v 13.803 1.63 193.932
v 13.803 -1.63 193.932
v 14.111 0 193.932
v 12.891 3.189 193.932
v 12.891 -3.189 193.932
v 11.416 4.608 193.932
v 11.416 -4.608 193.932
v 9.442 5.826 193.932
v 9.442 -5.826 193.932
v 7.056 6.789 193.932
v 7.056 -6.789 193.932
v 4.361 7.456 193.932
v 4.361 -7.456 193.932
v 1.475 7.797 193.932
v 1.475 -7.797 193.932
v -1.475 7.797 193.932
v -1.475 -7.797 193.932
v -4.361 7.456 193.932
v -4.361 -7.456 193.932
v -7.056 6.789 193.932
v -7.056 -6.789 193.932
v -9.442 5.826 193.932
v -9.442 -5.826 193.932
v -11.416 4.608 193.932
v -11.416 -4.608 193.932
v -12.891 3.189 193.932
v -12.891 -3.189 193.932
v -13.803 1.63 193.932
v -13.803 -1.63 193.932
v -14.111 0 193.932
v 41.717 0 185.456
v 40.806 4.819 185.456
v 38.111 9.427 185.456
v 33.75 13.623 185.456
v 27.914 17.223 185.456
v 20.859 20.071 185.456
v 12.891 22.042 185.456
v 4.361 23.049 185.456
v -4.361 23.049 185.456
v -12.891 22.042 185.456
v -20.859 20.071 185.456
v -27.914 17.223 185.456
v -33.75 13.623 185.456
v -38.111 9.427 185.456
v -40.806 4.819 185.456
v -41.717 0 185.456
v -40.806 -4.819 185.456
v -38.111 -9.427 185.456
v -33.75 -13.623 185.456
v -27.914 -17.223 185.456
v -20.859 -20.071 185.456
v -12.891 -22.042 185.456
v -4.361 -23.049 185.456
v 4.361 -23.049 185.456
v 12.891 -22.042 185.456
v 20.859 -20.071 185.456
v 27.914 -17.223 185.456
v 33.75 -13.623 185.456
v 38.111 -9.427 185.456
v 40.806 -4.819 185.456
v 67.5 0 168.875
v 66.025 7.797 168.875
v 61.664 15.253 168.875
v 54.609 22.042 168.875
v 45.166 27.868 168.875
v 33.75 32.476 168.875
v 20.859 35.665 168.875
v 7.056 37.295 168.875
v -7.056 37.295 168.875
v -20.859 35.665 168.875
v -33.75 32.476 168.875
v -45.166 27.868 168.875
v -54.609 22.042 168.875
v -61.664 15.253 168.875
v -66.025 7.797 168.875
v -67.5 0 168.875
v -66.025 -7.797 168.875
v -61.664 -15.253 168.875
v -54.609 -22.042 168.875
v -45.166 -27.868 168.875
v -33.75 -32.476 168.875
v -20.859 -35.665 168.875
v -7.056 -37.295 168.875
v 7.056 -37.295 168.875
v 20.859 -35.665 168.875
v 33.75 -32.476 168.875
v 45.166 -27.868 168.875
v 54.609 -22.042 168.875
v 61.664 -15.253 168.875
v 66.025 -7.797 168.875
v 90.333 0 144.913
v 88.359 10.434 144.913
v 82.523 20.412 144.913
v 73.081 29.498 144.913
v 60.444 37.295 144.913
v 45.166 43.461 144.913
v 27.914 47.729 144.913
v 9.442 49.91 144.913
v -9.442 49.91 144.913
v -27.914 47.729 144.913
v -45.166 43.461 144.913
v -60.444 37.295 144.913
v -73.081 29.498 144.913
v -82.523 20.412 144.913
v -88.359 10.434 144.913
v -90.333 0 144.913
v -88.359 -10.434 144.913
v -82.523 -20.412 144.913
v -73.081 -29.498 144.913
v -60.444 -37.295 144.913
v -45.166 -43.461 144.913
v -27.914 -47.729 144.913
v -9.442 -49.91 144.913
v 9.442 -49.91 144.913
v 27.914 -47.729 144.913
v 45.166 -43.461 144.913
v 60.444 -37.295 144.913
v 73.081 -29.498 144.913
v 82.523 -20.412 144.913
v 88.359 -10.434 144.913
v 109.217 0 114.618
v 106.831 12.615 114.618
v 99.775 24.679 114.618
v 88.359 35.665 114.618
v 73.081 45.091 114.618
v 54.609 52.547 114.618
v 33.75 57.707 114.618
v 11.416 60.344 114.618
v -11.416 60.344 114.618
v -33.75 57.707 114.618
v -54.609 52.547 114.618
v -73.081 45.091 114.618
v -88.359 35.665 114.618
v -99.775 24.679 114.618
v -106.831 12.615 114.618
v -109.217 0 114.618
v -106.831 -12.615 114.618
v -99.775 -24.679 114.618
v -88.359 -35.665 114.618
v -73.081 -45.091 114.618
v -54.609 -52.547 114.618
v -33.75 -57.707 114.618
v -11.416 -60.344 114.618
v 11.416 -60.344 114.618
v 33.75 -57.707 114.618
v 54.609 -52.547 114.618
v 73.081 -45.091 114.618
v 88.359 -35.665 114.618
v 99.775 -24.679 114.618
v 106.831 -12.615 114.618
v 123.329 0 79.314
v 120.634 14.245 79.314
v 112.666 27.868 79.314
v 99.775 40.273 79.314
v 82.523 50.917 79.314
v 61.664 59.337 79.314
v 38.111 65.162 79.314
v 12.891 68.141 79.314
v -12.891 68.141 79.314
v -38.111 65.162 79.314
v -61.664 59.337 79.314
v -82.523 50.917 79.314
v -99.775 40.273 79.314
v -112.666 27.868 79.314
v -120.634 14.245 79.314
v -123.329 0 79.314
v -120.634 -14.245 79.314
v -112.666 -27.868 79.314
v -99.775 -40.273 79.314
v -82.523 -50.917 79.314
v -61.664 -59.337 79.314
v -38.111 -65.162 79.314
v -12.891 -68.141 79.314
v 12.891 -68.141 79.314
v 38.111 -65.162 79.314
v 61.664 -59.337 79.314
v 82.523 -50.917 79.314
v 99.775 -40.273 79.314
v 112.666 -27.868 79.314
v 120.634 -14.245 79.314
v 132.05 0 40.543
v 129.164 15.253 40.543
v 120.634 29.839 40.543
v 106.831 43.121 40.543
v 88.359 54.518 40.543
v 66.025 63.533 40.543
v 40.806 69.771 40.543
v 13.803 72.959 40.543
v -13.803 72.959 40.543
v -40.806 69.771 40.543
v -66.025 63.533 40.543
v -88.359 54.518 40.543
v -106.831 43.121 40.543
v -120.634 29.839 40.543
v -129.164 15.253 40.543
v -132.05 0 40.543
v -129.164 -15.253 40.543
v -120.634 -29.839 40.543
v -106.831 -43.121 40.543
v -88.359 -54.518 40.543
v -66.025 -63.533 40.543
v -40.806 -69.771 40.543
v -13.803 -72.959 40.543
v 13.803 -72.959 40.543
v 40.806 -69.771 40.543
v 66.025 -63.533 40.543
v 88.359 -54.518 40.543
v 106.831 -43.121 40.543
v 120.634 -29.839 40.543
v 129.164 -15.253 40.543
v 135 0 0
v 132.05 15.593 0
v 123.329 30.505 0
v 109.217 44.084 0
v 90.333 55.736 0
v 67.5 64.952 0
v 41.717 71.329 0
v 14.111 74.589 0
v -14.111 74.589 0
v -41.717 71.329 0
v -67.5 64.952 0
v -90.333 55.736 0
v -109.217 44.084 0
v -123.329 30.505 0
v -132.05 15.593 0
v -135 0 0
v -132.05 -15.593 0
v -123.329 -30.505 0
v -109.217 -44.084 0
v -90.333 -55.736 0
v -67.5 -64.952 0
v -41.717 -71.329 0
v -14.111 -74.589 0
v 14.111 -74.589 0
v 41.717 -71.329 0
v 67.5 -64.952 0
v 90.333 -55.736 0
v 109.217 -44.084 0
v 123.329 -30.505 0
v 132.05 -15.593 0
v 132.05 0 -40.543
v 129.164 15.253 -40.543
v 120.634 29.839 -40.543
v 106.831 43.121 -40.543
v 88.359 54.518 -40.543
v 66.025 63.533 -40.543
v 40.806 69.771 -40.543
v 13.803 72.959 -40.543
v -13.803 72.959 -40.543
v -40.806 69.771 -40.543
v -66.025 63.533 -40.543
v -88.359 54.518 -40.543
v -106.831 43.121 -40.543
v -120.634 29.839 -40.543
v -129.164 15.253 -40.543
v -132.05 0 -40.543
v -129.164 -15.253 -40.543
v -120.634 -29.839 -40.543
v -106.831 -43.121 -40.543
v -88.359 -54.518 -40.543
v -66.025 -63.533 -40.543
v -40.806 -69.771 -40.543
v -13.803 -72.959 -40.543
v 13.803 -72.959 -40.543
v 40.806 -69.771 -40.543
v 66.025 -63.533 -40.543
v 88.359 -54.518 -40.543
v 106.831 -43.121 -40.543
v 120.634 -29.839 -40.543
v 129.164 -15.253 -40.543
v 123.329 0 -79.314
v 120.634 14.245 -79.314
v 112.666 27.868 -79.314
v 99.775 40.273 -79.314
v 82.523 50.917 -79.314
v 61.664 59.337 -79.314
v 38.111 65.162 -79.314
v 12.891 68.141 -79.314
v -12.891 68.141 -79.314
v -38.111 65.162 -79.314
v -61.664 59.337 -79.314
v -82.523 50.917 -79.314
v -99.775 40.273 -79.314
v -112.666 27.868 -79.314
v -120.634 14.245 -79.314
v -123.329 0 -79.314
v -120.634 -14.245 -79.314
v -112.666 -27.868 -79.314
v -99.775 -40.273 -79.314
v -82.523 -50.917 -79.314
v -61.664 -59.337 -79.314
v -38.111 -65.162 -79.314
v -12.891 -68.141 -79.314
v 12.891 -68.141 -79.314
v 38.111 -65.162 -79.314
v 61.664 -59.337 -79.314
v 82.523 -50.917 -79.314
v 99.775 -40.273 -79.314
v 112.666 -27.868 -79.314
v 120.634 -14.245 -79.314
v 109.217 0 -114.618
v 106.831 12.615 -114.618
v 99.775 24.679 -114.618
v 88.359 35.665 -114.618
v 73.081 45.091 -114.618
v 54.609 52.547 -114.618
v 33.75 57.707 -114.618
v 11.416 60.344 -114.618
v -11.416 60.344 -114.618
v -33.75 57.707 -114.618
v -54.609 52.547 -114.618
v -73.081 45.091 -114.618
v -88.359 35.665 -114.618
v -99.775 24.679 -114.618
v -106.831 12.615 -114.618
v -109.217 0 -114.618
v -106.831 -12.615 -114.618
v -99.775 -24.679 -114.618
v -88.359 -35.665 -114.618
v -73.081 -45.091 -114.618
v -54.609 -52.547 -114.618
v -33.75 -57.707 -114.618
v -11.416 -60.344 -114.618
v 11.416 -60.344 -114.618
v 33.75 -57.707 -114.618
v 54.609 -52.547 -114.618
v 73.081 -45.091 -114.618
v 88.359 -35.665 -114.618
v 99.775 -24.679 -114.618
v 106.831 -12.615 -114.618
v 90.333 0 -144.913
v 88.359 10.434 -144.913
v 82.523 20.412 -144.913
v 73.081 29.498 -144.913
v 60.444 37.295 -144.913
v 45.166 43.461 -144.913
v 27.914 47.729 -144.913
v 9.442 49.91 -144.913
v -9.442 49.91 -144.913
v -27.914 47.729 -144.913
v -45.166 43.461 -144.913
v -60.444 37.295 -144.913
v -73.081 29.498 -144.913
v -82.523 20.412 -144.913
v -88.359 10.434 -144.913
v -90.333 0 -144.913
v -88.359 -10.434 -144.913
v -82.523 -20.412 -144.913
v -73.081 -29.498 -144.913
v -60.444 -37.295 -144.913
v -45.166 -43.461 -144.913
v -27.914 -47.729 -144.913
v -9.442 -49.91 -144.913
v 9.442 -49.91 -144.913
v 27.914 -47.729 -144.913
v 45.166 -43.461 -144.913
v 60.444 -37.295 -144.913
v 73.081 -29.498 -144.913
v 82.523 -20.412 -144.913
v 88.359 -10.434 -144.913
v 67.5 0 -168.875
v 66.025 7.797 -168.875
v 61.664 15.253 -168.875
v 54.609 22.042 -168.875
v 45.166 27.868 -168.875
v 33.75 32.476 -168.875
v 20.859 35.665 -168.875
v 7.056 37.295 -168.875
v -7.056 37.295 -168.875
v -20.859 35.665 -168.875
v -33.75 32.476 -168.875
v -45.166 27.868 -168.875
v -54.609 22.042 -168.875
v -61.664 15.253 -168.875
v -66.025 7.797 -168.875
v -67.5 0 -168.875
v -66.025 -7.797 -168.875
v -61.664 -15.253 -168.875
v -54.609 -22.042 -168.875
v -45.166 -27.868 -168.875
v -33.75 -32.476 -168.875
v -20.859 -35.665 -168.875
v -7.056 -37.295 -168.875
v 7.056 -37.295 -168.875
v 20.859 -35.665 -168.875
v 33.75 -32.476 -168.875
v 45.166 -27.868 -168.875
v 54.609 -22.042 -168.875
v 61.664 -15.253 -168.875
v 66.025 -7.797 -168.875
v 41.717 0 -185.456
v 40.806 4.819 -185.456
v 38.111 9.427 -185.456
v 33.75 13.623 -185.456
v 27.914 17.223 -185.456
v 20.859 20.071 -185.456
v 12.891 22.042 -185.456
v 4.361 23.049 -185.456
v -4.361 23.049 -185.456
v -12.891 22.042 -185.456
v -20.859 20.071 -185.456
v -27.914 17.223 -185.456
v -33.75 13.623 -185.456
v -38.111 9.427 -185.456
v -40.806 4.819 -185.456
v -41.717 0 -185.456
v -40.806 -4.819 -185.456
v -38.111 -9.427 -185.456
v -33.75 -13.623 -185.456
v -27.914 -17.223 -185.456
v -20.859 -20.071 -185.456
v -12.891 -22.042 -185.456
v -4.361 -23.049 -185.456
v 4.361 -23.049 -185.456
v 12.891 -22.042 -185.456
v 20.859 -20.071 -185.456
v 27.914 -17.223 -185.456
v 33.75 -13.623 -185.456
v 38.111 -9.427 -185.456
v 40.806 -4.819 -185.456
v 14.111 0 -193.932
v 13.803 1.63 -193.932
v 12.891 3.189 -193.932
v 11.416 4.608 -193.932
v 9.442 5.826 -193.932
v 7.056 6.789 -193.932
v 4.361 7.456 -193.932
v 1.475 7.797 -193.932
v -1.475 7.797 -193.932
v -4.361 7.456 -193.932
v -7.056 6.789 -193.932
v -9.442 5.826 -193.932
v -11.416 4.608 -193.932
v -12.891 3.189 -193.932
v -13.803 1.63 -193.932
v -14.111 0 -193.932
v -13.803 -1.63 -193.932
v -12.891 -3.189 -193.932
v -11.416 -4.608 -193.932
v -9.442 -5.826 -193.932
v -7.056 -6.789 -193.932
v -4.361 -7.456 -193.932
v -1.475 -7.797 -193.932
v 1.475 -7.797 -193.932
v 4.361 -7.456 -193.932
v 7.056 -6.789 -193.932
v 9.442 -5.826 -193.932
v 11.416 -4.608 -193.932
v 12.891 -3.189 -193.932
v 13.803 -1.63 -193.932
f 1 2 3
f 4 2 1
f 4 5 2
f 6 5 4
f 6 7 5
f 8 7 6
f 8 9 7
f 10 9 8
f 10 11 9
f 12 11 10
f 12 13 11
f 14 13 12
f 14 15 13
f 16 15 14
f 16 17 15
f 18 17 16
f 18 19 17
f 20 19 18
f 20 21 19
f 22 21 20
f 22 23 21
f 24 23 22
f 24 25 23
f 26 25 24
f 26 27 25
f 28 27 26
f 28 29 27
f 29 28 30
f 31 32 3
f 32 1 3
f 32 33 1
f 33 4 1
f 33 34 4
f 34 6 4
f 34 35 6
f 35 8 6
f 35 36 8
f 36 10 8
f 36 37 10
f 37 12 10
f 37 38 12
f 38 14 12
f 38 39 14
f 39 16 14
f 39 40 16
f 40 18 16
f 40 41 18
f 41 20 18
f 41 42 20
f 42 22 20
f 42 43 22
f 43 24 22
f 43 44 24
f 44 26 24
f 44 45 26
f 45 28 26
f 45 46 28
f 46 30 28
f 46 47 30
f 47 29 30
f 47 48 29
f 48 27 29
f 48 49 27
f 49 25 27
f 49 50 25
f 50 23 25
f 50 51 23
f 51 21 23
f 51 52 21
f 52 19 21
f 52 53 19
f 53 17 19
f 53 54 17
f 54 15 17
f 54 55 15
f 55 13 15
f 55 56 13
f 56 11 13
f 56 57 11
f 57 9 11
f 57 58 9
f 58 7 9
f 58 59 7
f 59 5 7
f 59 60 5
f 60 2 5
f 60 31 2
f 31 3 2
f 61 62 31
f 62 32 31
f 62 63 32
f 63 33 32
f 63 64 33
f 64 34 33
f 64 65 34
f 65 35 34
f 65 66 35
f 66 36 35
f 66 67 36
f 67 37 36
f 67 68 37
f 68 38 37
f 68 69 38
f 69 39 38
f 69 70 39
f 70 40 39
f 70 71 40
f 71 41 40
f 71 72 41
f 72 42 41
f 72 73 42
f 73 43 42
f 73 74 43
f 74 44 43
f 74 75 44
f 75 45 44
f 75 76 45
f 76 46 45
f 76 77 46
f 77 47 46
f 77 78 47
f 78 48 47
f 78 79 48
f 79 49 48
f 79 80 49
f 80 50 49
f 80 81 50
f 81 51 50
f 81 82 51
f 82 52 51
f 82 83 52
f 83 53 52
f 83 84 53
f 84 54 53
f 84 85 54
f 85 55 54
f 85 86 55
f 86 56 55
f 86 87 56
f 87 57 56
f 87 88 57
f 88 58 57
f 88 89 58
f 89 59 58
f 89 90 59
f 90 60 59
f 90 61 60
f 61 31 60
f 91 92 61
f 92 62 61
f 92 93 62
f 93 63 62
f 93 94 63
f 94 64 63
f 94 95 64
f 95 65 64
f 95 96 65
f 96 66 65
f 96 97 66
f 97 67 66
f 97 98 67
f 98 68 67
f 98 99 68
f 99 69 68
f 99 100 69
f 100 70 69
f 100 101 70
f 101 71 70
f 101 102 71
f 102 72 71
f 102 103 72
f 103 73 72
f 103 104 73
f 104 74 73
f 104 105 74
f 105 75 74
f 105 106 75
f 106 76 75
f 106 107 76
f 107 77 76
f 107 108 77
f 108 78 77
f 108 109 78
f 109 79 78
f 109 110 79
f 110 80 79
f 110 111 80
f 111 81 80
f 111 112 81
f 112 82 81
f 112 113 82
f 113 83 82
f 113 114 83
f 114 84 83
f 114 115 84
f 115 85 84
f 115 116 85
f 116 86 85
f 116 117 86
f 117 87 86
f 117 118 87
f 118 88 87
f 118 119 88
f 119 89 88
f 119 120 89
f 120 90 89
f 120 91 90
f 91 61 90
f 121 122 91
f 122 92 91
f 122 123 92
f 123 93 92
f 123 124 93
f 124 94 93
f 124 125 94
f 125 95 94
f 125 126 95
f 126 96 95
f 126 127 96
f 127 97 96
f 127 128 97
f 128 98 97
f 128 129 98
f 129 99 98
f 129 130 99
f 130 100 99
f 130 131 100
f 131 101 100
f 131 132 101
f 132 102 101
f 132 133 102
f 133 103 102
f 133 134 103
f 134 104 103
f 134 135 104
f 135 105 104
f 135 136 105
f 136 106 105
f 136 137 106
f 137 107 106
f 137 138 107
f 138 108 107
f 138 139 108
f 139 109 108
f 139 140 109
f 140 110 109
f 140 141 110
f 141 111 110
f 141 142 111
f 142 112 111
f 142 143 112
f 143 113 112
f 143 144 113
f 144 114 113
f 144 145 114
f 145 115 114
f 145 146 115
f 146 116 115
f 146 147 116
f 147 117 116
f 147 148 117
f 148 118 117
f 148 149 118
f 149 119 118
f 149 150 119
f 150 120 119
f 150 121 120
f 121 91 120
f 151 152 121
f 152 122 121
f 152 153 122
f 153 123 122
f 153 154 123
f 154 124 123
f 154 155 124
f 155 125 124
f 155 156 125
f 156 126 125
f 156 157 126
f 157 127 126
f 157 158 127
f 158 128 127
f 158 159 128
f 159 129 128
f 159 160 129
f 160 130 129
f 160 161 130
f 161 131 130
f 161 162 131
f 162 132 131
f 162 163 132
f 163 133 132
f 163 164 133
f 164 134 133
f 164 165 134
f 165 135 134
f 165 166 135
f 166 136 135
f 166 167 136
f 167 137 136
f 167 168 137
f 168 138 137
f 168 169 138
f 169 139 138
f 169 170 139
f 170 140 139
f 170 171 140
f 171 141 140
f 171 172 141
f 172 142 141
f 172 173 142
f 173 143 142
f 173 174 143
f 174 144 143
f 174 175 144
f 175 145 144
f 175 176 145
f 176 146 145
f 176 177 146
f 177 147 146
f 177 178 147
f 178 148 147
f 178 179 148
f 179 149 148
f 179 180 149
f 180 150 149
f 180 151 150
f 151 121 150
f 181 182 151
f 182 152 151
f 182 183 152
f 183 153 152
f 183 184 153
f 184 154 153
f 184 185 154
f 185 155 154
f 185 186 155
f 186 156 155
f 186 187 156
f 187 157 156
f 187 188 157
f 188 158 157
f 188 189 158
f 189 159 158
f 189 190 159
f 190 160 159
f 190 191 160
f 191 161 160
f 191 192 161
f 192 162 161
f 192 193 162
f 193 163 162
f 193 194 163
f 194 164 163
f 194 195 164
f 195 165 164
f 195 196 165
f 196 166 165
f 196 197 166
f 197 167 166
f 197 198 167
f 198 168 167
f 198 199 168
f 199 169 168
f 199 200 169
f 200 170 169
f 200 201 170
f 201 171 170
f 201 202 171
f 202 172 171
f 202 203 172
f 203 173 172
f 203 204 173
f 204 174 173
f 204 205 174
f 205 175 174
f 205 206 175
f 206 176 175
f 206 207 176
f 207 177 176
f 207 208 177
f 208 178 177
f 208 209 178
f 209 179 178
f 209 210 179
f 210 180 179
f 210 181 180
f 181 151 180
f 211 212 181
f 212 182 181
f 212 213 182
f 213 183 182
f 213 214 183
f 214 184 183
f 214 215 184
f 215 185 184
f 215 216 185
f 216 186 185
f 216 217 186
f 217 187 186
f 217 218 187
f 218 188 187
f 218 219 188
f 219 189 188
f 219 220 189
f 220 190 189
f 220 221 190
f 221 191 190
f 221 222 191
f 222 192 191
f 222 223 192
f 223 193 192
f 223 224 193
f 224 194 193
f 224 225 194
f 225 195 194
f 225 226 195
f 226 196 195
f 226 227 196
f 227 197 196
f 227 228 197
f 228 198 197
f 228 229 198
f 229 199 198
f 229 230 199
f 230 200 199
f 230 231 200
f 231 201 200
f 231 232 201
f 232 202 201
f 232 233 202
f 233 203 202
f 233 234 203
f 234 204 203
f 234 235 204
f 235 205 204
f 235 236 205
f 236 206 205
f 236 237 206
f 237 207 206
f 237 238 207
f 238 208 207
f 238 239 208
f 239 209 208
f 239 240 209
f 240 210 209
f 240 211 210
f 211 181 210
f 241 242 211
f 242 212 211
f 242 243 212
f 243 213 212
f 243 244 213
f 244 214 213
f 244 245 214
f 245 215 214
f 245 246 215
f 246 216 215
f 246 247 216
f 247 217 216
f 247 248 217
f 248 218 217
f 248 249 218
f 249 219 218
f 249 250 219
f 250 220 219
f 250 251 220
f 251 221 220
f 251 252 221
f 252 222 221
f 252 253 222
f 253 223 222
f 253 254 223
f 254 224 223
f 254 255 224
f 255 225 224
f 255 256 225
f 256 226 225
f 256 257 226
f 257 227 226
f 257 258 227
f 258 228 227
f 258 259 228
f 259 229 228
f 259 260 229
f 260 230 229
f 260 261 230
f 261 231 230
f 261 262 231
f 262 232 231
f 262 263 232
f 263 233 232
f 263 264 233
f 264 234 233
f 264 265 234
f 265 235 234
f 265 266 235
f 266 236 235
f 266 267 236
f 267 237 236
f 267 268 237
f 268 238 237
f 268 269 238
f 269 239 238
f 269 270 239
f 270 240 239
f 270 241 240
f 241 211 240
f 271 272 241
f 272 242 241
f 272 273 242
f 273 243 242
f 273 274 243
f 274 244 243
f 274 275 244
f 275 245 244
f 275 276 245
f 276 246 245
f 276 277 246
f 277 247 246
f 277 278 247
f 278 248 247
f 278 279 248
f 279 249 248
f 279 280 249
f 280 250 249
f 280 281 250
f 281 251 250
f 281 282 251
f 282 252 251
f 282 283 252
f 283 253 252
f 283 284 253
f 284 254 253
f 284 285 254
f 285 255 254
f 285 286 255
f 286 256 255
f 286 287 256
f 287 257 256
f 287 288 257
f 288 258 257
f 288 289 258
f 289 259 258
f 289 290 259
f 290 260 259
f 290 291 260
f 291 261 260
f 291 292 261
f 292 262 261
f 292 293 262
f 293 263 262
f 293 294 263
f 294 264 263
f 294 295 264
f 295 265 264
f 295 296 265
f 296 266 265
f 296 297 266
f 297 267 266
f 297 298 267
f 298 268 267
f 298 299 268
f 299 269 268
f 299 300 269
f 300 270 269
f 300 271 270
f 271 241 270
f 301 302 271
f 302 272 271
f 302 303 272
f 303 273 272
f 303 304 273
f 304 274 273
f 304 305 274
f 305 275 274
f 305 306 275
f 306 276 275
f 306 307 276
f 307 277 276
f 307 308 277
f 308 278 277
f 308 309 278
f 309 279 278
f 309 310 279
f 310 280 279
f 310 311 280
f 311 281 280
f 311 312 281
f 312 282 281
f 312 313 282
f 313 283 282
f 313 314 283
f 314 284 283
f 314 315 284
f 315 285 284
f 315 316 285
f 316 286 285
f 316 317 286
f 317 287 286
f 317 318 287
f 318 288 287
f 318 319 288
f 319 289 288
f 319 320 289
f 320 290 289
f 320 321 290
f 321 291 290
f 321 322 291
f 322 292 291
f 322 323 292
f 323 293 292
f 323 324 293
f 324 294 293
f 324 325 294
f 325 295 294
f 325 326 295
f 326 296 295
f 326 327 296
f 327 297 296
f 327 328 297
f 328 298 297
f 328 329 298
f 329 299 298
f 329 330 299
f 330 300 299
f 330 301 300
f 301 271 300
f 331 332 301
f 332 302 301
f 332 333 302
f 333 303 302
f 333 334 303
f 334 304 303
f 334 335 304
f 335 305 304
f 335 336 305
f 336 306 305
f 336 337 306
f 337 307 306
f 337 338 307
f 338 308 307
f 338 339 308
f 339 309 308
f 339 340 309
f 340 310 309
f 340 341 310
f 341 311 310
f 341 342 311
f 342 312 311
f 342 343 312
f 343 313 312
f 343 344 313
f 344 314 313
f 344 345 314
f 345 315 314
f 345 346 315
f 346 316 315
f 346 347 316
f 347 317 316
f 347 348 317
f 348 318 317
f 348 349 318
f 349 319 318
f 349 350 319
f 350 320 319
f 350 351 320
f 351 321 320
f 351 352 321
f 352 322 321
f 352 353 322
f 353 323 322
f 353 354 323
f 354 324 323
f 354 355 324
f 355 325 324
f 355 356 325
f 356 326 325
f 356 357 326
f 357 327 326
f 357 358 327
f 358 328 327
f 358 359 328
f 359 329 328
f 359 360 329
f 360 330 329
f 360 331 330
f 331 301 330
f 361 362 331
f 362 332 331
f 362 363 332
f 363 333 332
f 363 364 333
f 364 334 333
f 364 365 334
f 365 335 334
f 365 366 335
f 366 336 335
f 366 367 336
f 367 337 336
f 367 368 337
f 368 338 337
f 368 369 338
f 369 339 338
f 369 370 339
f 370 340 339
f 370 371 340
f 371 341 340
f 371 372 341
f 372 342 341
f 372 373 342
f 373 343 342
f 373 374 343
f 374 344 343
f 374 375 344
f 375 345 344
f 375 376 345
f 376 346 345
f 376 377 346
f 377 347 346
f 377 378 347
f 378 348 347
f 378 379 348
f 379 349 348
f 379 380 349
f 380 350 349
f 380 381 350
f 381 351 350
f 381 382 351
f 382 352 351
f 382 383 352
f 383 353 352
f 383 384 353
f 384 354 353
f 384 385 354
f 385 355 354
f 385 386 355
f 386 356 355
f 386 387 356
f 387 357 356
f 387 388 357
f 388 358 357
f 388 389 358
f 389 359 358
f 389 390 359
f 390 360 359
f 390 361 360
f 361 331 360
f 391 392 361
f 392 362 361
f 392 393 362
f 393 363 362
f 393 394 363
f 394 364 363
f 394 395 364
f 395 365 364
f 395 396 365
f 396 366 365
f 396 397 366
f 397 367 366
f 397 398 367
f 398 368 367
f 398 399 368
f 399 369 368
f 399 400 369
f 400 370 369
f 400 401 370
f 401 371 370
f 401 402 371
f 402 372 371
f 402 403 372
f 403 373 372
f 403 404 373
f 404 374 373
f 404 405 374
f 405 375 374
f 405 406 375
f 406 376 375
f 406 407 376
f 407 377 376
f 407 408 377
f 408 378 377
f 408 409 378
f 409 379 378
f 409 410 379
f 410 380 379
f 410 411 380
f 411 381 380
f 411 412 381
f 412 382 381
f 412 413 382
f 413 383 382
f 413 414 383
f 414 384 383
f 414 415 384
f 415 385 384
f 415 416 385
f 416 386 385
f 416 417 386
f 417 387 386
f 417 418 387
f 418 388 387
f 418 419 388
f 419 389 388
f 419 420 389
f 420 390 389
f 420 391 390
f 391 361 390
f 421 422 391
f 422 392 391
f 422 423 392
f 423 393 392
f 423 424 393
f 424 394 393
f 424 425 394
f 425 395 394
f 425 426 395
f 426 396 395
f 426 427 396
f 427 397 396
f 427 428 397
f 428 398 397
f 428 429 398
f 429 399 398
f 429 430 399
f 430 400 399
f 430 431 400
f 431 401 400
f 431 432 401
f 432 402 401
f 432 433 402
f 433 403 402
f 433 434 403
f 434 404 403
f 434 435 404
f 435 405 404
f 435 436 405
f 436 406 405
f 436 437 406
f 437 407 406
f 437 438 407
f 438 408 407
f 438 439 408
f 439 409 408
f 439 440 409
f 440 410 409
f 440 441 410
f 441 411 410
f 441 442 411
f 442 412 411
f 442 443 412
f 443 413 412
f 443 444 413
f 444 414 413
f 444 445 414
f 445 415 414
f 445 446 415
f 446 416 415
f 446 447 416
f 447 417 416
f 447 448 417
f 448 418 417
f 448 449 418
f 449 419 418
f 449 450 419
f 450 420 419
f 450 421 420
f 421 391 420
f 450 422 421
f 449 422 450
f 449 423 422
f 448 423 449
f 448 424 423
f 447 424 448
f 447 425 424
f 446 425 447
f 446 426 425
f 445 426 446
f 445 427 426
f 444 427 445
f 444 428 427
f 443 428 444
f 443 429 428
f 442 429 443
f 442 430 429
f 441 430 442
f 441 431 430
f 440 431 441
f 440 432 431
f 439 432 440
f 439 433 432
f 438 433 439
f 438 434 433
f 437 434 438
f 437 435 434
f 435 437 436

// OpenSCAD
// Generated by SolidPython 1.0.1 on 2020-07-29 00:46:48


scale(v = [9, 5, 13]) {
	sphere(r = 15);
}
/***********************************************
*********      SolidPython code:      **********
************************************************
 
# import packages: SolidPython
from solid import *
from solid.utils import *
from itertools import chain, combinations, permutations


class Resize:

    def __init__(self, scad_file):
        self.scad_file = scad_file
        #self.scad_file = import_scad(scad_file)
        # cone/cylinder param:
        self.r1 = 0
        self.r2 = 0
        self.h = 0
        # rectangular prism param:
        self.w = 0
        self.l = 0
        # ellipse param:
        self.r = 0

    # import OpenScad code (file name corresponds to shape)


    # classify shape + parameters
    def assign(self, param1, param2, param3):
        if self.scad_file == 'cone.scad':
            self.r1 = param1
            self.r2 = param2
            self.h = param3
        elif self.scad_file == 'cylinder.scad':
            self.r1 = param1
            self.r2 = param2
            self.h = param3
        elif self.scad_file == 'rectangularPrism.scad':
            self.h = param1
            self.l = param2
            self.w = param3
        else:
            self.r = param1
            self.h = param2

    # resize parameters
    def iterate(self):
        x = range(3, 20, 2)
        i = 1
        if self.scad_file == 'cone.scad':
            tempList = list(permutations(x, 2))
            for temp in tempList:
                param1 = temp[0]
                param2 = temp[1]
                filepath = 'produced_scad_files/' + 'cone' + str(param1) + '_' + str(param2) + '_' + '.scad'
                scad_render_to_file(cylinder(h=param1, r1=param2, r2=0), filepath)

        elif self.scad_file == 'cylinder.scad':
            tempList = list(permutations(x, 3))
            for temp in tempList:
                param1 = temp[0]
                param2 = temp[1]
                filepath = 'produced_scad_files/' + 'cylinder' + str(param1) + '_' + str(param2) + '_' + '.scad'
                scad_render_to_file(cylinder(h=param1, r1=param2, r2=param2), filepath)

        elif self.scad_file == 'rectangularPrism.scad':
            tempList = list(permutations(x, 3))
            for temp in tempList:
                param1 = temp[0]
                param2 = temp[1]
                param3 = temp[2]
                filepath = 'produced_scad_files/' + 'rectangularPrism' + str(param1) + '_' + str(param2) + '_' + str(
                    param3) + '.scad'
                scad_render_to_file(cube(size=(param1, param2, param3)), filepath)

        elif self.scad_file == 'ellipse.scad':
            tempList = list(permutations(x, 4))
            for temp in tempList:
                param1 = temp[0]
                param2 = temp[1]
                param3 = temp[2]
                param4 = temp[3]
                filepath = 'produced_scad_files/' + 'ellipse' + str(param1) + '_' + str(param2) + '_' + str(param3) + '_' + str(param4) + '.scad'
                scad_render_to_file(scale([param1, param2, param3])(sphere(r=param4)), filepath)

    def render_to_scadfile(self):
        scad_render_to_file(scad, 'example.scad') 
 
************************************************/
